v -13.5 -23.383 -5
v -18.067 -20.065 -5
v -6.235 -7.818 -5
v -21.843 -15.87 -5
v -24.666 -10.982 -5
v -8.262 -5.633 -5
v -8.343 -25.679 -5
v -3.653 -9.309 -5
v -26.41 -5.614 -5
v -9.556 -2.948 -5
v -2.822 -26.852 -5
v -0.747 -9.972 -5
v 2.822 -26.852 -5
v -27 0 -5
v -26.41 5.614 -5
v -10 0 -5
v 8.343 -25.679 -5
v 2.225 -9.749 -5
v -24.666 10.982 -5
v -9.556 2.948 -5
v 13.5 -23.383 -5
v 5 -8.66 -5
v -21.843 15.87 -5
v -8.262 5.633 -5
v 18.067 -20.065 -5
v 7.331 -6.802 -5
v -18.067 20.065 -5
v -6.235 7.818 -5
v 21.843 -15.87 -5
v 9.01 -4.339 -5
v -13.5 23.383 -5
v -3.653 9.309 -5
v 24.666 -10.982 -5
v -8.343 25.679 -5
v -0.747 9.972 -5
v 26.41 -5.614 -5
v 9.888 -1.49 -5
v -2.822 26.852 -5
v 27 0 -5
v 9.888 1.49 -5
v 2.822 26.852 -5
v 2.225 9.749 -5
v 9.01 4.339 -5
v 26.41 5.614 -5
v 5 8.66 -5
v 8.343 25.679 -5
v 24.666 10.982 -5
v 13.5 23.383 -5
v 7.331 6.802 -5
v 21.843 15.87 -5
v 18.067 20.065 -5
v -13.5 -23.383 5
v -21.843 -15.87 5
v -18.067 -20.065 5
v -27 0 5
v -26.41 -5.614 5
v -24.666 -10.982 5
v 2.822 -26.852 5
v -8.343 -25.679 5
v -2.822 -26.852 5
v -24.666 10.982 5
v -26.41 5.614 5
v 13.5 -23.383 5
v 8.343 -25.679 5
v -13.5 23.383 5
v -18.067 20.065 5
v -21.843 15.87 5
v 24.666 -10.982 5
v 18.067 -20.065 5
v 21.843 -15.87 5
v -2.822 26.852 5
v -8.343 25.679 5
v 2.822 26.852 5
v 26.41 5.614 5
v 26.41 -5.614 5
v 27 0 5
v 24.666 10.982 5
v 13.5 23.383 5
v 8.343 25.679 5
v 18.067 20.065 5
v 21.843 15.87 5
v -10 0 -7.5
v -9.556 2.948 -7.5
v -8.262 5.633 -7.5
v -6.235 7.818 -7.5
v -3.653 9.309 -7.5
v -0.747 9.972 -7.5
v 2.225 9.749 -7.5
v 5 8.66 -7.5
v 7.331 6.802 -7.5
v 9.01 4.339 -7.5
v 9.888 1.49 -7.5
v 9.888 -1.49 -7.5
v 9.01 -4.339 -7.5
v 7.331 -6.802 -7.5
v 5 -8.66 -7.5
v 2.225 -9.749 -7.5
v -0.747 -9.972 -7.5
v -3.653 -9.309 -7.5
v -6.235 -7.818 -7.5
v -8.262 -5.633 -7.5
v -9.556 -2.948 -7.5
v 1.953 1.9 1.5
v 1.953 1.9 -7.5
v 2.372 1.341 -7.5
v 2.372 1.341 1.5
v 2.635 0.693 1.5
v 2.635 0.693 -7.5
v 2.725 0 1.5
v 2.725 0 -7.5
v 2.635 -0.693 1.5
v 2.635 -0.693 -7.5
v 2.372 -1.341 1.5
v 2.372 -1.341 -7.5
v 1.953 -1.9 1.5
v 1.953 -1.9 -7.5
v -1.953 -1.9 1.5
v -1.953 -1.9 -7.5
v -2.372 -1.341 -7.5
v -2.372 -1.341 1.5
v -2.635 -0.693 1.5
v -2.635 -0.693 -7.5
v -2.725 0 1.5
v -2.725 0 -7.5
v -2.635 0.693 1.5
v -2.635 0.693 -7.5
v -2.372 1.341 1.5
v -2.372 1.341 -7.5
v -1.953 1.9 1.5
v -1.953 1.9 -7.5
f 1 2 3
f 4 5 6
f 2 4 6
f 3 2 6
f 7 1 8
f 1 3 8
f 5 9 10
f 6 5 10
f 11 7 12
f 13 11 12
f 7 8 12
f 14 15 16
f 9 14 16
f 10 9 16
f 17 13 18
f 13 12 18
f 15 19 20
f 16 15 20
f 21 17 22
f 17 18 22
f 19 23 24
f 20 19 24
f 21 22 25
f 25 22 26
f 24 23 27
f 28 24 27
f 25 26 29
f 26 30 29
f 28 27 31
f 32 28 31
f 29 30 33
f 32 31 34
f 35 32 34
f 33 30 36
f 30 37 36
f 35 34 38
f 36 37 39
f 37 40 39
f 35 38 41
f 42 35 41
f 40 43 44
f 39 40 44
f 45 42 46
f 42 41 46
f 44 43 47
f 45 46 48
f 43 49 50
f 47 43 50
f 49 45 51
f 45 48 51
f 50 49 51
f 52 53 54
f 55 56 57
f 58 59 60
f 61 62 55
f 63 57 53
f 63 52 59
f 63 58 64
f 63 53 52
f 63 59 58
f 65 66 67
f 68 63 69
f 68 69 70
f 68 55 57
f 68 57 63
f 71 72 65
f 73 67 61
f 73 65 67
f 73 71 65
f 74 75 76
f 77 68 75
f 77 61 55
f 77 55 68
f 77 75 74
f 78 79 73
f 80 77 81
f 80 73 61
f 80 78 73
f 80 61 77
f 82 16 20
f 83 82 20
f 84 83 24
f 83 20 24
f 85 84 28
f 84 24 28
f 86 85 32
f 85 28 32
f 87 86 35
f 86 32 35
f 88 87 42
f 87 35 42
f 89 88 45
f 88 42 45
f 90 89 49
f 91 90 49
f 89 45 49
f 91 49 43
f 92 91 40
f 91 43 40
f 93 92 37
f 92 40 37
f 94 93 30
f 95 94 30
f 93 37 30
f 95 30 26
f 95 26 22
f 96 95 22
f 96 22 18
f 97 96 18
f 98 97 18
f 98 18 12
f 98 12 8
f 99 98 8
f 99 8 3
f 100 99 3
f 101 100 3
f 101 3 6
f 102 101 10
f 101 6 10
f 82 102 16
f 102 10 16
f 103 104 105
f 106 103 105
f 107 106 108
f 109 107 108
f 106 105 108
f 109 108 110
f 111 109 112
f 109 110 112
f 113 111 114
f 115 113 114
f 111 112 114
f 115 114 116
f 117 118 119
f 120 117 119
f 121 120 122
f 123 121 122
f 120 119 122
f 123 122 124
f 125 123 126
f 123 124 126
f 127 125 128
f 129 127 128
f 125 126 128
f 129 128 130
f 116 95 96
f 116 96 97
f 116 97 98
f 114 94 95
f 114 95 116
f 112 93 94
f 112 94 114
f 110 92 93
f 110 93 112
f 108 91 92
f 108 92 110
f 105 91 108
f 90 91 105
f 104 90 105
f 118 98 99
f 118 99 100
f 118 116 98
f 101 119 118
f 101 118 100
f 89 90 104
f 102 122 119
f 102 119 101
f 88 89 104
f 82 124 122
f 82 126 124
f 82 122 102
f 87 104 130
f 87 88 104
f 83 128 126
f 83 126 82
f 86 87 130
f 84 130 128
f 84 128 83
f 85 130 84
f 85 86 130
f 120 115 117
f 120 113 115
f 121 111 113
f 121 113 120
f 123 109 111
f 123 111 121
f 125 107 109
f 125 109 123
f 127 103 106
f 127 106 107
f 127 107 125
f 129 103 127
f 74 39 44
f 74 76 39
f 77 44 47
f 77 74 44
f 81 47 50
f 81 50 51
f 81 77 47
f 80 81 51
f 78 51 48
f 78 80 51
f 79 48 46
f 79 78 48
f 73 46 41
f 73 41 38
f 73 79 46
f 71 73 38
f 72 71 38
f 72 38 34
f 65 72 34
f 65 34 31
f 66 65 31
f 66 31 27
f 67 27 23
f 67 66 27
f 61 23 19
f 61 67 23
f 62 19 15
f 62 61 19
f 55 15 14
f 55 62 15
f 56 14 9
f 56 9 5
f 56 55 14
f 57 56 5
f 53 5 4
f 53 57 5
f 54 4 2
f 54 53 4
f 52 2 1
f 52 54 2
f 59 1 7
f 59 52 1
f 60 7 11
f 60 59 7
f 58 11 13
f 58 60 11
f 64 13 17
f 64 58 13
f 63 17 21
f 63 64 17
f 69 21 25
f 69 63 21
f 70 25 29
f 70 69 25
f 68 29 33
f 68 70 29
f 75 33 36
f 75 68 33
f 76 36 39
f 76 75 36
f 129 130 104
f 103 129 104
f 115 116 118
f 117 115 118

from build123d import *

# Parameters (mm, degrees)
SKETCH1_R           = 27
BOSS_EXTRUDE1_DEPTH = 5
SKETCH2_R           = 10
BOSS_EXTRUDE2_DEPTH = 2.5
CUT_EXTRUDE1_DEPTH  = 9


with BuildPart() as part:
    # Sketch1 → Boss-Extrude1 (new, symmetric)
    with BuildSketch(Plane.XY):
        Circle(SKETCH1_R)
    extrude(amount=BOSS_EXTRUDE1_DEPTH, both=True)

    # Sketch2 → Boss-Extrude2 (add)
    with BuildSketch(Plane(origin=(0, 0, -5), x_dir=(-1, 0, 0), z_dir=(0, 0, -1))):
        Circle(SKETCH2_R)
    extrude(amount=BOSS_EXTRUDE2_DEPTH)

    # Sketch3 → Cut-Extrude1 (cut)
    with BuildSketch(Plane(origin=(0, 0, -7.5), x_dir=(-1, 0, 0), z_dir=(0, 0, -1))):
        with BuildLine():
            Line((-1.953362486, -1.9), (1.953362486, -1.9))
            ThreePointArc((1.953362486, -1.9), (2.725, 0), (1.953362486, 1.9))
            Line((1.953362486, 1.9), (-1.953362486, 1.9))
            ThreePointArc((-1.953362486, 1.9), (-2.725, 0), (-1.953362486, -1.9))
        make_face()
    extrude(amount=-CUT_EXTRUDE1_DEPTH, mode=Mode.SUBTRACT)


solid = part.part
